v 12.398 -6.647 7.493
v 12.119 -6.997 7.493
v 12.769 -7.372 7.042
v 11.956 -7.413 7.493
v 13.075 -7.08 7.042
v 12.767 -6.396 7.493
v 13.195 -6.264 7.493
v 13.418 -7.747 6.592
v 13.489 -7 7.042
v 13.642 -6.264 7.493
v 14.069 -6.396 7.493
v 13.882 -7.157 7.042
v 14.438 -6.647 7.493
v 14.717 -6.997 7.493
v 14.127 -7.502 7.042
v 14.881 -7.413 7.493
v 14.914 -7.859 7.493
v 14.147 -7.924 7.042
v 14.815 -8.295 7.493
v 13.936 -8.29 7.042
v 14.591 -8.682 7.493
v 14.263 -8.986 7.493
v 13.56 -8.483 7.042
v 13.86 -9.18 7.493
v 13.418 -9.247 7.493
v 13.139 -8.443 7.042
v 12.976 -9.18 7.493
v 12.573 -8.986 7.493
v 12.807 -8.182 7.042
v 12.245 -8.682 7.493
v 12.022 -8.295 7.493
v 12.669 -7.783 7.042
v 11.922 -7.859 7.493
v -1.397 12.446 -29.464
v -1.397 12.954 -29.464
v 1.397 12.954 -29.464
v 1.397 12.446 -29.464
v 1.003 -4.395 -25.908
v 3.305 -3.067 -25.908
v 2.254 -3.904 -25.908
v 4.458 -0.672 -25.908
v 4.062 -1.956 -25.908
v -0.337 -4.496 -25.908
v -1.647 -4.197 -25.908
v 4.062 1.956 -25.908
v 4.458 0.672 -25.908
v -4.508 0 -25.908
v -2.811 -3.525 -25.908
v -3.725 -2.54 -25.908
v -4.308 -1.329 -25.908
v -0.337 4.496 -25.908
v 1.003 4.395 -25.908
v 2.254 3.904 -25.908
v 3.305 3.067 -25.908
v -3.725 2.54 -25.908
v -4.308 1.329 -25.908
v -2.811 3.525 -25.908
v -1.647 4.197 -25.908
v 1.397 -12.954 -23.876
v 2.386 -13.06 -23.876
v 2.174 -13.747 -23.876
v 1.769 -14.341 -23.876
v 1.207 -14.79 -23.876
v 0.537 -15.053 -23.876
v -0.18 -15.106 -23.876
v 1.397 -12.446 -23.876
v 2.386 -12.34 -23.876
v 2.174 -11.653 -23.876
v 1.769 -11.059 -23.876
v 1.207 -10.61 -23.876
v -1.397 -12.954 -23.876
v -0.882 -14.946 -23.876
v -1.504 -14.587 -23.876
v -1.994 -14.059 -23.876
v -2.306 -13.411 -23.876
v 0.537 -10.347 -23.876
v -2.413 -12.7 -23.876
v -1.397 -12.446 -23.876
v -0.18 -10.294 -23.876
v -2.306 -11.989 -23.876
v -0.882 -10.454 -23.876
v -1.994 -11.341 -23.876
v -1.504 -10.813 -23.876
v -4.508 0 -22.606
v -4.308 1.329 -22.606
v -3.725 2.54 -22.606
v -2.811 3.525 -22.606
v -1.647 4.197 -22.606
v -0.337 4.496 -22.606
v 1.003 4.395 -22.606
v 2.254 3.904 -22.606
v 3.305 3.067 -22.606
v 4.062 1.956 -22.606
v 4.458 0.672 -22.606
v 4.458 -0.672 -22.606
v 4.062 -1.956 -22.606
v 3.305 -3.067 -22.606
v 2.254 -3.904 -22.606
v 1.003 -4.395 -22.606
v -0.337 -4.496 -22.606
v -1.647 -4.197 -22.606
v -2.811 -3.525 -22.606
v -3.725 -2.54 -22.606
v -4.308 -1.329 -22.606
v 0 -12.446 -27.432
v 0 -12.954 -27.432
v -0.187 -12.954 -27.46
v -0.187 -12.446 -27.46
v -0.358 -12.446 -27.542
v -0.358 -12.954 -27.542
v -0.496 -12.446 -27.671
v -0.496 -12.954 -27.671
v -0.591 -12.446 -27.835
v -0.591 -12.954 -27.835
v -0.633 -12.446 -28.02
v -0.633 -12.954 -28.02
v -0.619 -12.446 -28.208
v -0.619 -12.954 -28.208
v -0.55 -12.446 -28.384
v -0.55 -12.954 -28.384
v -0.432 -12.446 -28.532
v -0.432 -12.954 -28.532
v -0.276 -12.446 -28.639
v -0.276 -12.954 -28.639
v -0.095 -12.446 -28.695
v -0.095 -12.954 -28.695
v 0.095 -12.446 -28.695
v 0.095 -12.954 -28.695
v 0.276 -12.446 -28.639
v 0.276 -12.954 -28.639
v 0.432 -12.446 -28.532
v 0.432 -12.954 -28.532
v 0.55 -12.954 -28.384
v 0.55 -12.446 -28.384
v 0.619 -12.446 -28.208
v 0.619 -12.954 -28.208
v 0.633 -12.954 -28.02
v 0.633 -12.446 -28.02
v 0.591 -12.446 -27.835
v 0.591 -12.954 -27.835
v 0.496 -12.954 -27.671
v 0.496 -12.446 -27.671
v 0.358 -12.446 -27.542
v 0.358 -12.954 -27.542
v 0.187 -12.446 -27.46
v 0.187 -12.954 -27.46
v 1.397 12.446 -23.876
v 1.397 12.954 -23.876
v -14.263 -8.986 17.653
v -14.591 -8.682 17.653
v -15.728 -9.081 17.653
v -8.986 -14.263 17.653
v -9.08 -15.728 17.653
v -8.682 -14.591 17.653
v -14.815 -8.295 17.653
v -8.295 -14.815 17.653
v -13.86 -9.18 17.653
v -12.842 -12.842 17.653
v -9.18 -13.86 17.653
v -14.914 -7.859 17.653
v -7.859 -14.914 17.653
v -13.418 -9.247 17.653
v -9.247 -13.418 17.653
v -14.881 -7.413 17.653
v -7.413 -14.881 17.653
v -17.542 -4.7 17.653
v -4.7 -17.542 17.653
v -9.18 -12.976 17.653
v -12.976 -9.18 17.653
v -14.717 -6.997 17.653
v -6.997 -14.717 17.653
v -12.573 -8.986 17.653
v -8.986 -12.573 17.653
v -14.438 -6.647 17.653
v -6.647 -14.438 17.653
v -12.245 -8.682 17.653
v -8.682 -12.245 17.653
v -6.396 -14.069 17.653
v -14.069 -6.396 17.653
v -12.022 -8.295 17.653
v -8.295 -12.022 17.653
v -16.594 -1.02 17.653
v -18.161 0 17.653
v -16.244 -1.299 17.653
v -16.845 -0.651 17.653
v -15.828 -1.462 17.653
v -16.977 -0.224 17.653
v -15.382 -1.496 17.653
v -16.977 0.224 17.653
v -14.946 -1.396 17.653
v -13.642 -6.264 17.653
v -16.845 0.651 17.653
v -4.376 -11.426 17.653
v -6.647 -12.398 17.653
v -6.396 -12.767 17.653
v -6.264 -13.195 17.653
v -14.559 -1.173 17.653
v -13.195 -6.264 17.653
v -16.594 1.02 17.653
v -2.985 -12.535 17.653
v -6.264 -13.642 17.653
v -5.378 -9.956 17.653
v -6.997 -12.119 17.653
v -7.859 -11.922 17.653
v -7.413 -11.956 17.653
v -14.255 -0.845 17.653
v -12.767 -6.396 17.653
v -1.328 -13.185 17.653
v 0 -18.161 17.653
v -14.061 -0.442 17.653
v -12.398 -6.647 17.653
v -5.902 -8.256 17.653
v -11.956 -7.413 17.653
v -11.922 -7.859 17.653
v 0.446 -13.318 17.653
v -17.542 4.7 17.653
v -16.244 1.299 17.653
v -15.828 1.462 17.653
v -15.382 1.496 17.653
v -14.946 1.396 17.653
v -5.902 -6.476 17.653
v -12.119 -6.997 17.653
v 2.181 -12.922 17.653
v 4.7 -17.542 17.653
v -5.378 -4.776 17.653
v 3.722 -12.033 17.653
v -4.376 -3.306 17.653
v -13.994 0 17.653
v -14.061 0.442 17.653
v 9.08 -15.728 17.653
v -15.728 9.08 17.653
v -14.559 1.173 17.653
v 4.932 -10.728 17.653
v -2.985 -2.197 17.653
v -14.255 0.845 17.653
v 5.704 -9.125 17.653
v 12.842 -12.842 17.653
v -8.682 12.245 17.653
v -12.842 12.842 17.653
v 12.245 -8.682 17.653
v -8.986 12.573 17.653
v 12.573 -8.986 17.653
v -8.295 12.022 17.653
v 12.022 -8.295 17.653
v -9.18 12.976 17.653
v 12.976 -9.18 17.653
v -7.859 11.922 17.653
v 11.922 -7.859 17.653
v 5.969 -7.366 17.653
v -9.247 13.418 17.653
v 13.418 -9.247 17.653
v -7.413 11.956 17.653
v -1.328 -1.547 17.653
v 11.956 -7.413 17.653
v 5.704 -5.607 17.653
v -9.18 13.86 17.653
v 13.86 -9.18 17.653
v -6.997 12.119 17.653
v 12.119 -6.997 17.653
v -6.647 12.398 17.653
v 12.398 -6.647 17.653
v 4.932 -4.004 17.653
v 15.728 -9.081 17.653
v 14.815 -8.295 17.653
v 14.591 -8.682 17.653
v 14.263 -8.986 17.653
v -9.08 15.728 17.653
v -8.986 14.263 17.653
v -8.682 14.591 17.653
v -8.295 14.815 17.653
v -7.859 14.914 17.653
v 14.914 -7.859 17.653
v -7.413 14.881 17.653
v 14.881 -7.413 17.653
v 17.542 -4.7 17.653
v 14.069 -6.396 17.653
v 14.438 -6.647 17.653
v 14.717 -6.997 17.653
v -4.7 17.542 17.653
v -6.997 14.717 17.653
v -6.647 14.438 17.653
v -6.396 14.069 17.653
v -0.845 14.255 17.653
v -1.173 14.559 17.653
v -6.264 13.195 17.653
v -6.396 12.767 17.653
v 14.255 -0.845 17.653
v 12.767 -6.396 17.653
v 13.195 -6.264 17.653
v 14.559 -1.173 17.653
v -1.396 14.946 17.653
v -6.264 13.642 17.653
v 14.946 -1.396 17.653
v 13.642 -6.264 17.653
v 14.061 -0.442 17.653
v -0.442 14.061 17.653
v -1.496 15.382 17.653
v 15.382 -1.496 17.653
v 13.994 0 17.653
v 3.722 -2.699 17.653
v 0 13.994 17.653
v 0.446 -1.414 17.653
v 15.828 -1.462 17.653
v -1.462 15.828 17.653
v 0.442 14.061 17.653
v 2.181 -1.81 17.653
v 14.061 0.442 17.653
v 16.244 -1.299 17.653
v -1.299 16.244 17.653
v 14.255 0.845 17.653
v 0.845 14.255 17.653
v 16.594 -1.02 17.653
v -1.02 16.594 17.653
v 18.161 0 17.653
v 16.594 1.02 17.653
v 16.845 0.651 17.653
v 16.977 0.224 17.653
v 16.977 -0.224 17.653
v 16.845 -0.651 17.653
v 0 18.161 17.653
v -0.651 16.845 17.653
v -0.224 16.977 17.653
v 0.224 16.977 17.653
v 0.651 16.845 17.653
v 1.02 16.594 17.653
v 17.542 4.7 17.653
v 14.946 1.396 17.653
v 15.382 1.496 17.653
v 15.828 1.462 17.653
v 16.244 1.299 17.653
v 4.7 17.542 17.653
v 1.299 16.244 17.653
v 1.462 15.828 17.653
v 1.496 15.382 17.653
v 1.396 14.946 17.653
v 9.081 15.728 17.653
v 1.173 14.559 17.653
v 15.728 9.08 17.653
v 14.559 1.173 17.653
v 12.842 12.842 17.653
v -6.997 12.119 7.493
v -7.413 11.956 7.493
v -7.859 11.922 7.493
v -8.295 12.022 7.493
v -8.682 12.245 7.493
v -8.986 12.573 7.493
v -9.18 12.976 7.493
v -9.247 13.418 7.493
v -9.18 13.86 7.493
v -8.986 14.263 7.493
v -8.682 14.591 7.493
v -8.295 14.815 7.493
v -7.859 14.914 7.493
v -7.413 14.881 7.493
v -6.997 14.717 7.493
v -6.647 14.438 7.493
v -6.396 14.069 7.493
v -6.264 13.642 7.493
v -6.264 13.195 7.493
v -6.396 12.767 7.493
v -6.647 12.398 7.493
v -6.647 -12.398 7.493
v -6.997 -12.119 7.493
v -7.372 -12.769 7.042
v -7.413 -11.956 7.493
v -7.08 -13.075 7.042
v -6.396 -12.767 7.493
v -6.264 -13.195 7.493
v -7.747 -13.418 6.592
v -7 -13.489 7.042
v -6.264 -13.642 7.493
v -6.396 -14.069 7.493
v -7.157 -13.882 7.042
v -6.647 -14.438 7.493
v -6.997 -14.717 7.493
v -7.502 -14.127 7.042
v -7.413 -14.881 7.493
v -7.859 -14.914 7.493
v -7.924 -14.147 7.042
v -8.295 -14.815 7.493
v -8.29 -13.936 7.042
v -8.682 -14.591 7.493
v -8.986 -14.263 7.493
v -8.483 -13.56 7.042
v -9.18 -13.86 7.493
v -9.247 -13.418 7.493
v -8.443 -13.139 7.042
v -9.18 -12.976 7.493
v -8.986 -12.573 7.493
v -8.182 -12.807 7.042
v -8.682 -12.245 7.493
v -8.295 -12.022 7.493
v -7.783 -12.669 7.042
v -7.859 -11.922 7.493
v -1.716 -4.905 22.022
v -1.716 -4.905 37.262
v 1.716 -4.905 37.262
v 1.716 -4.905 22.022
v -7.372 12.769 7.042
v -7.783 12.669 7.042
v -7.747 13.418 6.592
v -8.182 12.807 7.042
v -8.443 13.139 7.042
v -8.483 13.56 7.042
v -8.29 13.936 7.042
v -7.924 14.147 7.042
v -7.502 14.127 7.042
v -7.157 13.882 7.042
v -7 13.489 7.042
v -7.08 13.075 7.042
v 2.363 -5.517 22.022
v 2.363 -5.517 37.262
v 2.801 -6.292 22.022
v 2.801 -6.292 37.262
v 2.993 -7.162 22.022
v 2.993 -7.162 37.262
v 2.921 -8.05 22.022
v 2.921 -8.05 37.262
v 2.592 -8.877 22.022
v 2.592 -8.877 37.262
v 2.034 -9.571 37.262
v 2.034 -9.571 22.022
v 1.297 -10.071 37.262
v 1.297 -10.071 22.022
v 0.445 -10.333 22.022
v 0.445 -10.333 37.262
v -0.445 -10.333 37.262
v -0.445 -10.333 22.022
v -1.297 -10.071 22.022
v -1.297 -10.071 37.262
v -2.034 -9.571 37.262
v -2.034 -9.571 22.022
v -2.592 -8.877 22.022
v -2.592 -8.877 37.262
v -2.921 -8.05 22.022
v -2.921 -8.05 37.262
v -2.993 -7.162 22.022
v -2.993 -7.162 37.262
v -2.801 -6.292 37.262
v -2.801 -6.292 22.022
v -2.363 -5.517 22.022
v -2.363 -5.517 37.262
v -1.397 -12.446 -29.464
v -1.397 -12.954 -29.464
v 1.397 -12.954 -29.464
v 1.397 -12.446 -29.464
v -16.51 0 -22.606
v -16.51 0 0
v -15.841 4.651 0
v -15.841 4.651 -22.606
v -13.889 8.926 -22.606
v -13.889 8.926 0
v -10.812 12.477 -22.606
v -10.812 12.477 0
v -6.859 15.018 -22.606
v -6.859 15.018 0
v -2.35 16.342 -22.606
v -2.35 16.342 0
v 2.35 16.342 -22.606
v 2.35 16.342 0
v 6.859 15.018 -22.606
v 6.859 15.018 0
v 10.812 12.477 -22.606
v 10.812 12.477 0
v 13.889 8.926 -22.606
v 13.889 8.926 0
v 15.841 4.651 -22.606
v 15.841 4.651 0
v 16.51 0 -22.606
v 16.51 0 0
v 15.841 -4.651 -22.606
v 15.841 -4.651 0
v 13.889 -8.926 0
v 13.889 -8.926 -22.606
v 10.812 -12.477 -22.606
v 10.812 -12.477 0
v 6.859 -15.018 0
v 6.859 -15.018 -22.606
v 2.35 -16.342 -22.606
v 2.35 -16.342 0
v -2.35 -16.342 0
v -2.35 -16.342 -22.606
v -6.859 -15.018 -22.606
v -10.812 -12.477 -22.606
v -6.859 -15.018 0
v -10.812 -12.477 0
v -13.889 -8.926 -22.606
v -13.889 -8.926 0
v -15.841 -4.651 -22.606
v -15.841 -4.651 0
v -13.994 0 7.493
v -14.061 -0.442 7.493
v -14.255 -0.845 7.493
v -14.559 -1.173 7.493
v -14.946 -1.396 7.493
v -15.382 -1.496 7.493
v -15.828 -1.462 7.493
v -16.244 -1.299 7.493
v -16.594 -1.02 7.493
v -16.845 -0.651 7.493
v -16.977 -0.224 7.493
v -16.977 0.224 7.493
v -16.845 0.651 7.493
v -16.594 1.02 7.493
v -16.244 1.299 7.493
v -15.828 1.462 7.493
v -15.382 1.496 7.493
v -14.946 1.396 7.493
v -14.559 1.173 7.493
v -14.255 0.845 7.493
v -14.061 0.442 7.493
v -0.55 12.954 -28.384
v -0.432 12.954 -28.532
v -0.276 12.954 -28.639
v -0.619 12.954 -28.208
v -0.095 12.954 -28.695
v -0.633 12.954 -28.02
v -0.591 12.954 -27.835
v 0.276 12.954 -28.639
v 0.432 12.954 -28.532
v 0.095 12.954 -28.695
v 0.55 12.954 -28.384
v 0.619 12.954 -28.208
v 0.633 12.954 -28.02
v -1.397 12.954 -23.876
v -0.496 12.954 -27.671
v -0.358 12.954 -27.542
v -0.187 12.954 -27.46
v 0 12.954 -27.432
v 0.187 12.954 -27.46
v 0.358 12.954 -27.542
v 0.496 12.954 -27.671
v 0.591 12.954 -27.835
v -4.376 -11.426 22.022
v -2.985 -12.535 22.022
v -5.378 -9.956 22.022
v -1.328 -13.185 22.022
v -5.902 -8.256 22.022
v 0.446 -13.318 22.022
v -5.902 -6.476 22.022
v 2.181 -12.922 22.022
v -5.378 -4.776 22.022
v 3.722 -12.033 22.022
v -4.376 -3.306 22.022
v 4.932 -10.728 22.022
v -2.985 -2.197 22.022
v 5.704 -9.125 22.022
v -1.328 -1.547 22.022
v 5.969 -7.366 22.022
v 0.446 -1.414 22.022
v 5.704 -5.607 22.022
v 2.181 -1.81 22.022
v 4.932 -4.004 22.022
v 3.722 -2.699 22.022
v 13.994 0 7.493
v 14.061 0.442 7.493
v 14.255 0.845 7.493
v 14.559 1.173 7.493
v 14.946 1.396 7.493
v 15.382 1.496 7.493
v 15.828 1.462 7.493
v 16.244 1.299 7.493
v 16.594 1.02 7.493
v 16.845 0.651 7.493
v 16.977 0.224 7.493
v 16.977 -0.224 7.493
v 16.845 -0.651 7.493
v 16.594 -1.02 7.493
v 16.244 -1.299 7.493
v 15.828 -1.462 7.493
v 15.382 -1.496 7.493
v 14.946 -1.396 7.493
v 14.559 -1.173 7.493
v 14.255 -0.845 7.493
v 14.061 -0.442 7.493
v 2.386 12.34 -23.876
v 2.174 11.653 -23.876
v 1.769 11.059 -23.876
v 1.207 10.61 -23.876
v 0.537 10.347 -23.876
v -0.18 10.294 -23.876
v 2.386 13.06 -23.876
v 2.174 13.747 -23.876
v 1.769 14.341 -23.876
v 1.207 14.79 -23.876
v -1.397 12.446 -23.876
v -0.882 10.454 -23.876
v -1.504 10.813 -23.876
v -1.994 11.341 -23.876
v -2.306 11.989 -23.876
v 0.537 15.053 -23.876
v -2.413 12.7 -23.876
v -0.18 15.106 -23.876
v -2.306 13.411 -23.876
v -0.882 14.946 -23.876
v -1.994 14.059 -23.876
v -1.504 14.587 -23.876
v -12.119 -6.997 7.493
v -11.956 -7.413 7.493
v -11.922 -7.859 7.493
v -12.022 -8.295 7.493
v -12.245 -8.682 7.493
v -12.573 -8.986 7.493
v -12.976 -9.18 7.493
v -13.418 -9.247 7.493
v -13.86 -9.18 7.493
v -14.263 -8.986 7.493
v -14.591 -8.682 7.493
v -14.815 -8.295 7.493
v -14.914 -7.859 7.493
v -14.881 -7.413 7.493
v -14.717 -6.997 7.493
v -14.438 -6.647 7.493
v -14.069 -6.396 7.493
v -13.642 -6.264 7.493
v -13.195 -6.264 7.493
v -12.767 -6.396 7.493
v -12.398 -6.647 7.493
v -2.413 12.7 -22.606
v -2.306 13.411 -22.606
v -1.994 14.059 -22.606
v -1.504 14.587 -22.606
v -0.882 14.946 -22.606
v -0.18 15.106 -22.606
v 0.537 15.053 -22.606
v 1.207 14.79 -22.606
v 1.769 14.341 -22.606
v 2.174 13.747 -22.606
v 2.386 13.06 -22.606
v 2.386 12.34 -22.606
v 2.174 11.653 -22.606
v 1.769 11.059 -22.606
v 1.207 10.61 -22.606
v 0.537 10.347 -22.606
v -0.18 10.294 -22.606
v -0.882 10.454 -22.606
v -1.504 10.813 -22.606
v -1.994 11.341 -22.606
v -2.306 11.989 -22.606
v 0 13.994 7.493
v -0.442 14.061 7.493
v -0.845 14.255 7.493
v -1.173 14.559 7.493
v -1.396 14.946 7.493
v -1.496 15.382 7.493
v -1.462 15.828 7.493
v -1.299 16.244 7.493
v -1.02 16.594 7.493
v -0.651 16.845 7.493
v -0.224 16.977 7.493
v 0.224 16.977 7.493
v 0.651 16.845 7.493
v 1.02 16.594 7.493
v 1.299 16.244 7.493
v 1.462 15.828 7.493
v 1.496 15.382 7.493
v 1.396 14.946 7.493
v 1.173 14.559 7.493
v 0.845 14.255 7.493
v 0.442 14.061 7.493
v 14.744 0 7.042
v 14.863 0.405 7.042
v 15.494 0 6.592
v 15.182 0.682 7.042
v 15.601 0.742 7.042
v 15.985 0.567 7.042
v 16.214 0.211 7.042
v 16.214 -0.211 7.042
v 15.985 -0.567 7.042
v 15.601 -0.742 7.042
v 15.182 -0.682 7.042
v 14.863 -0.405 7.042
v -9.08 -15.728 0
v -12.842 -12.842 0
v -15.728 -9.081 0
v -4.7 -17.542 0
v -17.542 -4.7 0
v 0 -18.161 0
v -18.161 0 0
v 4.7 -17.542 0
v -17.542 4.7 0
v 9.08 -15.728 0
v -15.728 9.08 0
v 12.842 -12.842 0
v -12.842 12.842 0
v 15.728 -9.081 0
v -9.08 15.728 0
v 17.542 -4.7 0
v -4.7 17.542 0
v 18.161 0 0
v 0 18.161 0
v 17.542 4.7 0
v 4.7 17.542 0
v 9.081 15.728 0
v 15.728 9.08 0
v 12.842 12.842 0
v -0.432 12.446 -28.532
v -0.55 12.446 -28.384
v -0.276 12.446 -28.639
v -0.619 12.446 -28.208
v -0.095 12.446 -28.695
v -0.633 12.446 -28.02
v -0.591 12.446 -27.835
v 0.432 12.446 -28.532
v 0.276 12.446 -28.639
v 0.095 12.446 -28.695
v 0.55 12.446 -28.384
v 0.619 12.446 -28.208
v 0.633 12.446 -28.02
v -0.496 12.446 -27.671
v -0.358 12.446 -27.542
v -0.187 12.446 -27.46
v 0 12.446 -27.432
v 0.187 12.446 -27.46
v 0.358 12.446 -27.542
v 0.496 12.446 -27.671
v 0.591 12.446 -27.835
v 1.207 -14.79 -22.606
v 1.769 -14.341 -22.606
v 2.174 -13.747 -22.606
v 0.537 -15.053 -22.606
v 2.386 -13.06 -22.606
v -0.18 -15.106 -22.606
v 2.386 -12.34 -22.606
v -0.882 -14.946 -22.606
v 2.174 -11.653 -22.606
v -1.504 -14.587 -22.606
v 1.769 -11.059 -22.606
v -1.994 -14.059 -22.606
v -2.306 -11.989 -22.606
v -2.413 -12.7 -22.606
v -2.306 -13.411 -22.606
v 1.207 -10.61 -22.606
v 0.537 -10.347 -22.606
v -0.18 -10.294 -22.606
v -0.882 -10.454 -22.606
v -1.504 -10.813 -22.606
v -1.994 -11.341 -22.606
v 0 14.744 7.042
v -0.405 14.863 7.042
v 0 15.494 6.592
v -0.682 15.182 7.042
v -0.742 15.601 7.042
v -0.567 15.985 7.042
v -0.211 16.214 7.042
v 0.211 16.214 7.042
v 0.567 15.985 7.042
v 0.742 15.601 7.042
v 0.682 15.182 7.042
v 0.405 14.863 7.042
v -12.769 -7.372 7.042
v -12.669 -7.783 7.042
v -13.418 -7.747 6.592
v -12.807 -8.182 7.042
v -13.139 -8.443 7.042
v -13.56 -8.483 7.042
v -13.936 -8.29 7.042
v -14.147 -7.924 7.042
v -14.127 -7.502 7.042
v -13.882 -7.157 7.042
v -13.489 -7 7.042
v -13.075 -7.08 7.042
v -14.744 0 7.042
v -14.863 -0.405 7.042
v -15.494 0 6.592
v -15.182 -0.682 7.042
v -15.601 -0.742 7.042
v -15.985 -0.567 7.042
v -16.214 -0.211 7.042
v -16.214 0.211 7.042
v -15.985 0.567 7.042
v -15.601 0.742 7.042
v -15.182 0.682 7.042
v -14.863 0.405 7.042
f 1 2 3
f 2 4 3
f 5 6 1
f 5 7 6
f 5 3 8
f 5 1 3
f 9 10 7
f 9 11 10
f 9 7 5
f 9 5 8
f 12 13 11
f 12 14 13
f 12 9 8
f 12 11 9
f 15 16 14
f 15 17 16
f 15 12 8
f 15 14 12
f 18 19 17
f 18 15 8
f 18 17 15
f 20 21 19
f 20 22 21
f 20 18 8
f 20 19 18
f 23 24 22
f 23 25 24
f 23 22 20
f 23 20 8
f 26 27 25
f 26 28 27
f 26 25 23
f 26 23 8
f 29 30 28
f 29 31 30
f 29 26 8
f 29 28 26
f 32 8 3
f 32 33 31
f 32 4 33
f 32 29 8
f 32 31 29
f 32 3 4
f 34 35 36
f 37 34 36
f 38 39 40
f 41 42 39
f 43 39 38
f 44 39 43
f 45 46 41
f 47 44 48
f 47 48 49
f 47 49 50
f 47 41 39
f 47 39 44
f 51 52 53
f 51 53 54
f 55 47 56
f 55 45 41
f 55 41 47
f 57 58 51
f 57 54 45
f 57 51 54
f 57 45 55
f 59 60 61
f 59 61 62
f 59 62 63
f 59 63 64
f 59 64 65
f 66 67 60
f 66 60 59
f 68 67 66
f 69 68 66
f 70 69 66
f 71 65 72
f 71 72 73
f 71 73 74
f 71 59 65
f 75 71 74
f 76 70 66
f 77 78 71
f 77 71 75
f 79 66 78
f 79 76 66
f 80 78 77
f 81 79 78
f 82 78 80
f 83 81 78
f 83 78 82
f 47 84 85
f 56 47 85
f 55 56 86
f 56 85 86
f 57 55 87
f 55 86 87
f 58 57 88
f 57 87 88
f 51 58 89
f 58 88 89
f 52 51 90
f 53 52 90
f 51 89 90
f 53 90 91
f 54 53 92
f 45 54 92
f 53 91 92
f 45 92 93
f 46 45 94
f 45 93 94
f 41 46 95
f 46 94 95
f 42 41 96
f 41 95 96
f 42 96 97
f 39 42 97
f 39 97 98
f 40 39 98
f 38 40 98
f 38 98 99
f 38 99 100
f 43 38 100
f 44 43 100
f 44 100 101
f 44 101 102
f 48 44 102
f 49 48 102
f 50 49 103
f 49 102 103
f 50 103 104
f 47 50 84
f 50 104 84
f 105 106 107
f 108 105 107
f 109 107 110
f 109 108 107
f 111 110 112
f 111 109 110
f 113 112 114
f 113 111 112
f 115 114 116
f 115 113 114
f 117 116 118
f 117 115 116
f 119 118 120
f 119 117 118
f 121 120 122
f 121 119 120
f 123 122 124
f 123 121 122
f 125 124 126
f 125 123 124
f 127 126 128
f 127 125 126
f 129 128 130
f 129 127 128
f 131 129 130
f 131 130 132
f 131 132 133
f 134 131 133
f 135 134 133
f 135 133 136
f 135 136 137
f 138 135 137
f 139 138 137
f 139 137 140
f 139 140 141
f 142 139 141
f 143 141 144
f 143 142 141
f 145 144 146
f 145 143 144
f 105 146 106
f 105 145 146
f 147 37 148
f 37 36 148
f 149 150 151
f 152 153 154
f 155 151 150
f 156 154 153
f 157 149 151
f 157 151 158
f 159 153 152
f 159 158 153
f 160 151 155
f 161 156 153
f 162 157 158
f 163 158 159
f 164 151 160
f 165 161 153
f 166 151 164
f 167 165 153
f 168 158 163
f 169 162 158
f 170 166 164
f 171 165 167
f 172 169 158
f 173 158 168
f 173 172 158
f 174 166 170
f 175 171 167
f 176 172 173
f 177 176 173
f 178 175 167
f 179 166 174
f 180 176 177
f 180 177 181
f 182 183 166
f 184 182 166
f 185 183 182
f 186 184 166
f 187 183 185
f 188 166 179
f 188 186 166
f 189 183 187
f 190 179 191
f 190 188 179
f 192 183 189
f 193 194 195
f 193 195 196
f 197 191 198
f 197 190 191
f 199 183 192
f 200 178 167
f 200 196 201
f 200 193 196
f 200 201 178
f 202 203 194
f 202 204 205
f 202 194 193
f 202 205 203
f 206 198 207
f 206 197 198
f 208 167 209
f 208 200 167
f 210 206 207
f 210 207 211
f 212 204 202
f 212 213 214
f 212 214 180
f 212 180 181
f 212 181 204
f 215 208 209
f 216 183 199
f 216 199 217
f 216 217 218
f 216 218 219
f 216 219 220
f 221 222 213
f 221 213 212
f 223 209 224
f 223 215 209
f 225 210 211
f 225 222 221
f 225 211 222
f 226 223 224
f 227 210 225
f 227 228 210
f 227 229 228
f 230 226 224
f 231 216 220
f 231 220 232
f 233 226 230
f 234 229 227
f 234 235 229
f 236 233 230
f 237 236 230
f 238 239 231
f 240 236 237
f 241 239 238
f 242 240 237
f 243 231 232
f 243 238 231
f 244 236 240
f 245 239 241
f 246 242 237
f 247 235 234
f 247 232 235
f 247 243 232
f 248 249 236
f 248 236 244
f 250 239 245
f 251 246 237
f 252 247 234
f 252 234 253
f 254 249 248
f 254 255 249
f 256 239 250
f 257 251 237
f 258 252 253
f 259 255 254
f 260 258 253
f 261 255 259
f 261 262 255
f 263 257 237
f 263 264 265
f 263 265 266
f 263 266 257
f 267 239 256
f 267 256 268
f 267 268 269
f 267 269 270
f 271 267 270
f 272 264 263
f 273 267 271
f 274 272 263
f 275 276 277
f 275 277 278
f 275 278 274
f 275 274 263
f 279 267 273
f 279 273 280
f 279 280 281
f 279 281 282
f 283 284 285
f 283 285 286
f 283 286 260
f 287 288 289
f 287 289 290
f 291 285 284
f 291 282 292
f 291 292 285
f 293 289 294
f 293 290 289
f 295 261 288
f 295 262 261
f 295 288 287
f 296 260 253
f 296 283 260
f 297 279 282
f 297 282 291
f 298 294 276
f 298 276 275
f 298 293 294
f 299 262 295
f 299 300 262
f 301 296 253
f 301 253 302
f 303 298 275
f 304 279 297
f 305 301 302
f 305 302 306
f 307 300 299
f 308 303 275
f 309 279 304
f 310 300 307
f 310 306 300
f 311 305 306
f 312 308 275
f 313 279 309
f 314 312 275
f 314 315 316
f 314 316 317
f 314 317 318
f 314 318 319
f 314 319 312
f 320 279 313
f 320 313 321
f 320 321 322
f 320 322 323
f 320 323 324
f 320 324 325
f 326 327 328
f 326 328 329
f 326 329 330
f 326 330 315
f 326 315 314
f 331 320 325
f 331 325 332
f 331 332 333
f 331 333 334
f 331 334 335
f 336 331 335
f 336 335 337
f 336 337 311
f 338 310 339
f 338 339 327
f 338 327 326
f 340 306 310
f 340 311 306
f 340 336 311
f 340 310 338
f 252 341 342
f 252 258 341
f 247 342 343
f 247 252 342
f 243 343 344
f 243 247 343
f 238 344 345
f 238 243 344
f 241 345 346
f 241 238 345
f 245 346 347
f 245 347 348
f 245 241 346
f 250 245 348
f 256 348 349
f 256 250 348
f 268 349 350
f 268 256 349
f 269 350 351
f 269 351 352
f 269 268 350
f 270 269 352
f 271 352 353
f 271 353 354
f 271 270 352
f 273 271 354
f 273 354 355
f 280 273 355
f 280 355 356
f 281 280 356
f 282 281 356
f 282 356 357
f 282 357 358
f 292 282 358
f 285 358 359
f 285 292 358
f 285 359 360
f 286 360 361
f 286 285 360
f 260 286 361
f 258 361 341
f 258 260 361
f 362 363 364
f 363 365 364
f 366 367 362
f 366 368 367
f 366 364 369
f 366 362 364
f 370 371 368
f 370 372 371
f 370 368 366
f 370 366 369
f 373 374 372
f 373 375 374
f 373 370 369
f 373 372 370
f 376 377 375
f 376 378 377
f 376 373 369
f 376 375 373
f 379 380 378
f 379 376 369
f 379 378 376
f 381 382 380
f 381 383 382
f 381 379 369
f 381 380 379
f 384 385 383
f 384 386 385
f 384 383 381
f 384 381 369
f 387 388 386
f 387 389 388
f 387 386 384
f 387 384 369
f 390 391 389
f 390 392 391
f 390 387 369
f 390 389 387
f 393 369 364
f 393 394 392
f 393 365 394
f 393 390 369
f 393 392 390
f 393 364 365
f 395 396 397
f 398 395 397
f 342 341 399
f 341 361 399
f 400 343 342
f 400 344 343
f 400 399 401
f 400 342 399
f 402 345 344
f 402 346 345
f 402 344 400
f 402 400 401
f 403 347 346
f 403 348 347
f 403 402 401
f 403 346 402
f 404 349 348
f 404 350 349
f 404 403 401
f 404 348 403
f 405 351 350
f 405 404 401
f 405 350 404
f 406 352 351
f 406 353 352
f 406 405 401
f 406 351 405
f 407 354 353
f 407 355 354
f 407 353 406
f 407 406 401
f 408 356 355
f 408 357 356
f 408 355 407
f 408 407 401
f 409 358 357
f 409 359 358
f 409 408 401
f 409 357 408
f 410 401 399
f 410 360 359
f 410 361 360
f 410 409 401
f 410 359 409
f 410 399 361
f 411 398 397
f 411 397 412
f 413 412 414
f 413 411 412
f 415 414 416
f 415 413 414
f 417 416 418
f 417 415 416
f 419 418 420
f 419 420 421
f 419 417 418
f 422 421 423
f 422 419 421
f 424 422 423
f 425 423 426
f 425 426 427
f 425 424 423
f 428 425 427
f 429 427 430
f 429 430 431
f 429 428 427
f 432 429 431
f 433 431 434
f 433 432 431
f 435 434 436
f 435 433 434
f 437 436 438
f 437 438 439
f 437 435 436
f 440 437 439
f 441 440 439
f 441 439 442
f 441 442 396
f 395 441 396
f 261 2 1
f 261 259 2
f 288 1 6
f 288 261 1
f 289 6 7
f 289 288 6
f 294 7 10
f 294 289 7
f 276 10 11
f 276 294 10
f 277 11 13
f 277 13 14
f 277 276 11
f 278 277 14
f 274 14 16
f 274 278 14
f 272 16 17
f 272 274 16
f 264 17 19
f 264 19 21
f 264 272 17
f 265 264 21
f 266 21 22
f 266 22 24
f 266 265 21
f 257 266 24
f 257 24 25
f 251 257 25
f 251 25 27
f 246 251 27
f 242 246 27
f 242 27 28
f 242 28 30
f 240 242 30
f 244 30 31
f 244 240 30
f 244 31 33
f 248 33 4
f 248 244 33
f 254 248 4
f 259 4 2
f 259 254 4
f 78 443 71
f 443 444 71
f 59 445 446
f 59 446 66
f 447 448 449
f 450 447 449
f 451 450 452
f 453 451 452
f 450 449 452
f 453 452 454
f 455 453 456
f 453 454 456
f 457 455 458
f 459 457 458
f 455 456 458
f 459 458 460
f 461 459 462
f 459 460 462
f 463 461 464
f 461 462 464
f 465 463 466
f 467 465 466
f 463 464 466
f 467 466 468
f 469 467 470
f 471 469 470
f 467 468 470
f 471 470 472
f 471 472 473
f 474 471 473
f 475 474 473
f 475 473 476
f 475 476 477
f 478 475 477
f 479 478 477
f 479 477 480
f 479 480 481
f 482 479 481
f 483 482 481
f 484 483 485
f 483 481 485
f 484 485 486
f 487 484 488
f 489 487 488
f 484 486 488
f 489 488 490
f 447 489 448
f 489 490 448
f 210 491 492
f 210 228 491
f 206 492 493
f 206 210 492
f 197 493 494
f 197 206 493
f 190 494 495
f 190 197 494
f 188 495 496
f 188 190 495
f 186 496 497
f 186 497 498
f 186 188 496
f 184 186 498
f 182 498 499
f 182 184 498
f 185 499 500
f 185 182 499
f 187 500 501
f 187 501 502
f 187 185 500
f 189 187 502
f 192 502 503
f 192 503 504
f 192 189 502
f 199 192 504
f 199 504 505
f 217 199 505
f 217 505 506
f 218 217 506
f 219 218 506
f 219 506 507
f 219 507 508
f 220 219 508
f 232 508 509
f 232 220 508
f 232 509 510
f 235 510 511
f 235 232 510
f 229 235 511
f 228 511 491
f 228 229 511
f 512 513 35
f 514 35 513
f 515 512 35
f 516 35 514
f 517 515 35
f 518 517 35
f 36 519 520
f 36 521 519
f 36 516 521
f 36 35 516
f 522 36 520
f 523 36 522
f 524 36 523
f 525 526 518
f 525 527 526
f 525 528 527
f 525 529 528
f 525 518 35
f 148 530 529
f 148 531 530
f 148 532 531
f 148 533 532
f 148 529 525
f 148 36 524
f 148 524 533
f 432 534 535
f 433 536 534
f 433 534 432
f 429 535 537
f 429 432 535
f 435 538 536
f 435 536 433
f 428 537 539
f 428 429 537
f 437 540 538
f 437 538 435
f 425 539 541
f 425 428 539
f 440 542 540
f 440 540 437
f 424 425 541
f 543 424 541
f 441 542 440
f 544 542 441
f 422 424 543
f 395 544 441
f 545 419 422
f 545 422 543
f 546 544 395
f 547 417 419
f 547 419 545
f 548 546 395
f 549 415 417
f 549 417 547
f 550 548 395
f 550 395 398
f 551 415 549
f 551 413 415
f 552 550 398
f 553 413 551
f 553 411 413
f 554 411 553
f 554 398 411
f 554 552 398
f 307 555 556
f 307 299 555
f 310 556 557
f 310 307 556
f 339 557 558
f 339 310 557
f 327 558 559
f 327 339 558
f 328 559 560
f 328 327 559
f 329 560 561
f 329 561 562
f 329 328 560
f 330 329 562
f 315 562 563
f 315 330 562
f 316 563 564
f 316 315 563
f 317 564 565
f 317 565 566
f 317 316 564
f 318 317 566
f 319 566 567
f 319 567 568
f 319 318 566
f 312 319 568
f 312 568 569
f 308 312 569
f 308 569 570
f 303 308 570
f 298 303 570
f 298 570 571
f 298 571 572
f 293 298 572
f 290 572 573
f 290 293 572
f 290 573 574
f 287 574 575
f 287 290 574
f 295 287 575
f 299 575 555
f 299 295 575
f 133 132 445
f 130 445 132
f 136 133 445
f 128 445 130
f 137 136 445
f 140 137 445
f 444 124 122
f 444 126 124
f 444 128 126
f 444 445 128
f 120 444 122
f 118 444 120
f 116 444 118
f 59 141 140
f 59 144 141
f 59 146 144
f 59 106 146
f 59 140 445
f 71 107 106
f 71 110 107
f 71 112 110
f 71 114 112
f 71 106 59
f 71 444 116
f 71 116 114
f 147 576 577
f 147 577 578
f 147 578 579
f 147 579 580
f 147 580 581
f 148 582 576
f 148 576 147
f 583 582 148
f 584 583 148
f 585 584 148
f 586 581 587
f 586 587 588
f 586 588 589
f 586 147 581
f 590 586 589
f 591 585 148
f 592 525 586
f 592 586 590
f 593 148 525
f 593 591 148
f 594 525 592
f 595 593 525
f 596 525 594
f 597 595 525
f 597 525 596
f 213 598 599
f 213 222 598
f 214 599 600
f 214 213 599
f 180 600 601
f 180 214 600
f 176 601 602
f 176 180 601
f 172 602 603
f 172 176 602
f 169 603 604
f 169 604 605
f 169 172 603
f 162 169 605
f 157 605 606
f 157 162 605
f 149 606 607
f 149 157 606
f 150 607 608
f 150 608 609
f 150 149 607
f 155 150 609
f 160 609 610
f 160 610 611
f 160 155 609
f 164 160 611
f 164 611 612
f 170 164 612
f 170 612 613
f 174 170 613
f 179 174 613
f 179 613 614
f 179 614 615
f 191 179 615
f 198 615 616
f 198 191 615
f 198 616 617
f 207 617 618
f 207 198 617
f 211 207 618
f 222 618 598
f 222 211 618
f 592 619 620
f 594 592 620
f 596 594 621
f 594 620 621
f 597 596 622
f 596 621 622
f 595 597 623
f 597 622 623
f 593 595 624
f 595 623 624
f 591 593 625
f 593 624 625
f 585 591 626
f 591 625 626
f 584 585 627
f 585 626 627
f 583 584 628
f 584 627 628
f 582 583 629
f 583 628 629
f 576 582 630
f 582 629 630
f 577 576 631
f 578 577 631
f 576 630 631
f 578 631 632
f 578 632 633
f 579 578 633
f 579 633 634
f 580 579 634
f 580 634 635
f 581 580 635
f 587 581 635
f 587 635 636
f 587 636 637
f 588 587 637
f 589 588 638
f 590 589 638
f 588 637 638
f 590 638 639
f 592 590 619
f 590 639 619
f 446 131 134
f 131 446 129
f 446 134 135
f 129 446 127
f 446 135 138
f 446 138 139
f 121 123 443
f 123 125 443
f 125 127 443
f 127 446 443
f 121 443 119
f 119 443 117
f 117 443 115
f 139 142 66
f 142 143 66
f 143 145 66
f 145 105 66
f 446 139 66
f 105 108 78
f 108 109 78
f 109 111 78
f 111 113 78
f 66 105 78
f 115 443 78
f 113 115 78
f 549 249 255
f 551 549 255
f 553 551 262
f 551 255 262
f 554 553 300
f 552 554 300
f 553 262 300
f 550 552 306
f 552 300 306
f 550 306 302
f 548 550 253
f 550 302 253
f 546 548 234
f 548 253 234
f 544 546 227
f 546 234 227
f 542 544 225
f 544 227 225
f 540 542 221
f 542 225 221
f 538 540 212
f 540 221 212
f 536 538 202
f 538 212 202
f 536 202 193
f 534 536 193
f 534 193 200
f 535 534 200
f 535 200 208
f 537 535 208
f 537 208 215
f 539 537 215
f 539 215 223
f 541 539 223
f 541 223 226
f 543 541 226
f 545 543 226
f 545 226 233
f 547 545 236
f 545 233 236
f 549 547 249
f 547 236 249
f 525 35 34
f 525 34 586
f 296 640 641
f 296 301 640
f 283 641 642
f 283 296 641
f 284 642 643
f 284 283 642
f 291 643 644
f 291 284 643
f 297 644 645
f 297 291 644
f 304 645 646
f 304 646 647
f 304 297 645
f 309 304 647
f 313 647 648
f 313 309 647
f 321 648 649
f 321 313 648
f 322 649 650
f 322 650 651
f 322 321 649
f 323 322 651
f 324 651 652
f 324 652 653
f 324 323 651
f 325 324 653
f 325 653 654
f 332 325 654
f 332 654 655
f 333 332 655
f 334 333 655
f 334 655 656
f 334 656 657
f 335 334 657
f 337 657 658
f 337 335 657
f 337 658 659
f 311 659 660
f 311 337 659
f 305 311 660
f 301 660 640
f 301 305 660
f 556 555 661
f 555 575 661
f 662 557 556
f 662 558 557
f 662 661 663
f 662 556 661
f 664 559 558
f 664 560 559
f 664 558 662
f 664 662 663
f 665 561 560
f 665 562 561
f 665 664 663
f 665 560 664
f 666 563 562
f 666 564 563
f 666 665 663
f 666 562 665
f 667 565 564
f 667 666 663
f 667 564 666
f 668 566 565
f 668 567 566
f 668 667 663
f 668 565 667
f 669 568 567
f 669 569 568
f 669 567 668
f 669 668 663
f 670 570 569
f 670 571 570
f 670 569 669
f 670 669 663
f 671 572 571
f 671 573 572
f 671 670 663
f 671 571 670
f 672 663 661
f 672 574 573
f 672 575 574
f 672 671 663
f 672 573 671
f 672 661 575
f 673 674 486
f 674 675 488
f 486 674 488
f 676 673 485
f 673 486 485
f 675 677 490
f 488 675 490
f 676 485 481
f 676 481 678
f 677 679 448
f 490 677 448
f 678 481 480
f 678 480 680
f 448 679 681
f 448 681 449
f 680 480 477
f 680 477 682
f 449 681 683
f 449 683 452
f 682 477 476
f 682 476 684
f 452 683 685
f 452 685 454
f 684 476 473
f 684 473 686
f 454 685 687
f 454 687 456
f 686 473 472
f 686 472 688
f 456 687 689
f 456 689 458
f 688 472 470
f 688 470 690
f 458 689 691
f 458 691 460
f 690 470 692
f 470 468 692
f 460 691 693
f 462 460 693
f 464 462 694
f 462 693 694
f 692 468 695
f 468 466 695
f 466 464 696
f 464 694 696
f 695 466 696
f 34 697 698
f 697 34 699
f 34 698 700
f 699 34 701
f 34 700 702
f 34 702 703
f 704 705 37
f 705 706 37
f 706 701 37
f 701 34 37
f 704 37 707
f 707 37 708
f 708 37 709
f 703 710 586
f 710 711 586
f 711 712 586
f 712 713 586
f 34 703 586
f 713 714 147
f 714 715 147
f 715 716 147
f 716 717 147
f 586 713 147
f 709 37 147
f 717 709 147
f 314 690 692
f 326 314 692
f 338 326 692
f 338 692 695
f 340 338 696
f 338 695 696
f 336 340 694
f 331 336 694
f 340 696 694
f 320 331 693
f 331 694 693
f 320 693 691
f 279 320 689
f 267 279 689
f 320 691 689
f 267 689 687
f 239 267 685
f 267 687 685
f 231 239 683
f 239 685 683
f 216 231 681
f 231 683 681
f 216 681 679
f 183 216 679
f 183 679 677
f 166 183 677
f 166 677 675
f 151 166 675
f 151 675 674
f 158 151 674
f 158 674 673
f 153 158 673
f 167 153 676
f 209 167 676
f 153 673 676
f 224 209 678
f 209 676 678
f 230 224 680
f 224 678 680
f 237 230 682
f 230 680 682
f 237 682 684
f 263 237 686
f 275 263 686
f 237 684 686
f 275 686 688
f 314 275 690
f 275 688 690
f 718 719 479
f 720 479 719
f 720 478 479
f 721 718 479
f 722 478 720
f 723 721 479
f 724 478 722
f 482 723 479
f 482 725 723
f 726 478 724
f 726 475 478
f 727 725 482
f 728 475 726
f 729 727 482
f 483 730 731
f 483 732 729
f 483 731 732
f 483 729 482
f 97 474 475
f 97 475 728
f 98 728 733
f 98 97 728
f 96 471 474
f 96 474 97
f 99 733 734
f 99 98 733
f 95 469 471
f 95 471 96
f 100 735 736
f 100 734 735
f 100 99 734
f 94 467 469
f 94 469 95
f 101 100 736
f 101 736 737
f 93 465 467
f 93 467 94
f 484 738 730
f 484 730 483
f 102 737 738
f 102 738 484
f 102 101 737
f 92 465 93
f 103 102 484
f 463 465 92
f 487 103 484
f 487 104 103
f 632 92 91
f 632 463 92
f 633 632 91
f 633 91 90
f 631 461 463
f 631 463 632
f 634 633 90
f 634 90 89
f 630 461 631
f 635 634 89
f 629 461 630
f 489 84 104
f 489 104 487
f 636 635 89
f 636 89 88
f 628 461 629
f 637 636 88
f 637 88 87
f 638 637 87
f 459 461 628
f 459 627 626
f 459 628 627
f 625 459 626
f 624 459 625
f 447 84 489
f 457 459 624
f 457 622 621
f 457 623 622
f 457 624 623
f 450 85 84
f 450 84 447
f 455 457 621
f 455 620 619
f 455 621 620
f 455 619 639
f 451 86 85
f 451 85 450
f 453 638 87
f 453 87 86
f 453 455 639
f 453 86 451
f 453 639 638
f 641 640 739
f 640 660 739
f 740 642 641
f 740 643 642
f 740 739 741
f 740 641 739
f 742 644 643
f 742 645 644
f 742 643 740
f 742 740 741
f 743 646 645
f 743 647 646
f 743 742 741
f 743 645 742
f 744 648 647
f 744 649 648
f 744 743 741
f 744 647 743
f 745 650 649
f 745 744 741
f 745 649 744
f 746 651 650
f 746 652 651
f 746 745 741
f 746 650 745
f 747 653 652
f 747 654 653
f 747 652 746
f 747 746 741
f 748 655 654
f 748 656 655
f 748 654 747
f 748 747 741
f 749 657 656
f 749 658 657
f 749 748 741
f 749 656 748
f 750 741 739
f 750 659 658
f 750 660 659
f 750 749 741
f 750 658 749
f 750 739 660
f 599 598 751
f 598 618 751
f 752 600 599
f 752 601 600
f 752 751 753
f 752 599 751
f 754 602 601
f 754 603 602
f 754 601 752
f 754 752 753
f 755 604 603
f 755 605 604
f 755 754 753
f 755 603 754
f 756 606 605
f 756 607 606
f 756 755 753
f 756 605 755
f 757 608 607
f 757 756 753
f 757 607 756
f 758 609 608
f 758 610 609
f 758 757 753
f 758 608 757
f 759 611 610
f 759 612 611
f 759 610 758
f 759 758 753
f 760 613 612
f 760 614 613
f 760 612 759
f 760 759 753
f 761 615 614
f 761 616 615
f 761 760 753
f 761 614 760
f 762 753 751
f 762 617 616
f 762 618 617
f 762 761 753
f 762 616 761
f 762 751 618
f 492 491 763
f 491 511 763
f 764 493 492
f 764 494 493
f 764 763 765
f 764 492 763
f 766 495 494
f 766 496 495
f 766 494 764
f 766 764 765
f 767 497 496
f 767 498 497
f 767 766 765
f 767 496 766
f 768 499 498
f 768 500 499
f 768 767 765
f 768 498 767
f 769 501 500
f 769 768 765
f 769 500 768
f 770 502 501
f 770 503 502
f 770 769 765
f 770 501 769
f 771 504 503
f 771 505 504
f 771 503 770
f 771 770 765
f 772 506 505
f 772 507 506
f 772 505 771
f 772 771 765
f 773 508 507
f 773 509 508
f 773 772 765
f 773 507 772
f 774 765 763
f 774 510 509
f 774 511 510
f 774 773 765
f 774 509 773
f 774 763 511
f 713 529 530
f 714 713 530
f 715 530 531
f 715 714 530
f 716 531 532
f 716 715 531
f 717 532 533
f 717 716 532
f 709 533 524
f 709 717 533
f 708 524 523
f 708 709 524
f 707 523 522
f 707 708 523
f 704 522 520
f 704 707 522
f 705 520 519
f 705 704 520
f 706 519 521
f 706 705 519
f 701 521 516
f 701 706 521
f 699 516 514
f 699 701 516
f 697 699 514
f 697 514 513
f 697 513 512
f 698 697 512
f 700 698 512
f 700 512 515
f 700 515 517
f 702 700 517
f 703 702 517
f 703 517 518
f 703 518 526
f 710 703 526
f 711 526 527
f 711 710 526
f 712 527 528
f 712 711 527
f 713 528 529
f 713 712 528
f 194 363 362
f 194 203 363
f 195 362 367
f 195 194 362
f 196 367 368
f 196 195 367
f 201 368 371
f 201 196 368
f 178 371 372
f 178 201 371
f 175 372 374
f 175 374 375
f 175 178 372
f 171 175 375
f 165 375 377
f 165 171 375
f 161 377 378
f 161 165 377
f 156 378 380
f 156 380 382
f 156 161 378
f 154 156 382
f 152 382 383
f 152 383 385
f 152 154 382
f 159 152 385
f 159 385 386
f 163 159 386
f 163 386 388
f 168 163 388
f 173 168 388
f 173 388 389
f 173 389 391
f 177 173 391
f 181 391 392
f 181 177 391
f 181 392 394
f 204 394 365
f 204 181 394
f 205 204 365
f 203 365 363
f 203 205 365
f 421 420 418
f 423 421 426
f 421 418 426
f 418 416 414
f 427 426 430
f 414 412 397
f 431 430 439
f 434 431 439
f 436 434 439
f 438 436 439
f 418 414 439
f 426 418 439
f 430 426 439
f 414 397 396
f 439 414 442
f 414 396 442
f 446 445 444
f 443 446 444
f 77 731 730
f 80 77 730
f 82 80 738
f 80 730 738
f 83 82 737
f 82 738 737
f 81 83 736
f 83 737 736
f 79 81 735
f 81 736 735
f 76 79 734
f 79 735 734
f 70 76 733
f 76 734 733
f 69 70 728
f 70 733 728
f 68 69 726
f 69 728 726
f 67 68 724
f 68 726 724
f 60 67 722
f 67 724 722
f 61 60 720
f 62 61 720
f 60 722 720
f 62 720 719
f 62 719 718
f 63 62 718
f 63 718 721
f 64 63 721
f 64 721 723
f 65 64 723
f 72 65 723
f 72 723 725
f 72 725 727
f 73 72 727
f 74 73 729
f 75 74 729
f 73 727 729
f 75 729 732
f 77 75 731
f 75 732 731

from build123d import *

# Parameters (mm, degrees)
SKETCH1_R           = 18.161
BOSS_EXTRUDE1_DEPTH = 17.653
SKETCH2_R           = 16.51
BOSS_EXTRUDE2_DEPTH = 22.606
SKETCH3_R           = 4.5085
BOSS_EXTRUDE3_DEPTH = 3.302
SKETCH4_R           = 2.413
BOSS_EXTRUDE4_DEPTH = 1.27
SKETCH5_R           = 5.969
BOSS_EXTRUDE5_DEPTH = 4.3688
BOSS_EXTRUDE6_DEPTH = 15.24
SKETCH8_W           = 5.588
SKETCH8_H           = 2.794
SKETCH8_R           = 0.635
BOSS_EXTRUDE7_DEPTH = 0.254
CIRPATTERN1_COUNT   = 2
CIRPATTERN2_COUNT   = 12


with BuildPart() as part:
    # Sketch1 → Boss-Extrude1 (new body)
    with BuildSketch(Plane.XY):
        Circle(SKETCH1_R)
    extrude(amount=BOSS_EXTRUDE1_DEPTH)

    # Sketch2 → Boss-Extrude2 (add)
    with BuildSketch(Plane(origin=(0, 0, 0), x_dir=(-1, 0, 0), z_dir=(0, 0, -1))):
        Circle(SKETCH2_R)
    extrude(amount=BOSS_EXTRUDE2_DEPTH)

    # Sketch3 → Boss-Extrude3 (add)
    with BuildSketch(Plane(origin=(0, 0, -22.606), x_dir=(-1, 0, 0), z_dir=(0, 0, -1))):
        Circle(SKETCH3_R)
    extrude(amount=BOSS_EXTRUDE3_DEPTH)

    # Sketch4 → Boss-Extrude4 (add)
    with BuildSketch(Plane(origin=(0, 0, -22.606), x_dir=(-1, 0, 0), z_dir=(0, 0, -1))):
        with Locations((0, -12.7)):
            Circle(SKETCH4_R)
        with Locations((0, 12.7)):
            Circle(SKETCH4_R)
    extrude(amount=BOSS_EXTRUDE4_DEPTH)

    # Sketch5 → Boss-Extrude5 (add)
    with BuildSketch(Plane.XY.offset(17.653)):
        with Locations((0, -7.366)):
            Circle(SKETCH5_R)
    extrude(amount=BOSS_EXTRUDE5_DEPTH)

    # Sketch6 → Boss-Extrude6 (add)
    with BuildSketch(Plane.XY.offset(22.0218)):
        with BuildLine():
            Line((-1.715657017, -4.905), (1.715657017, -4.905))
            ThreePointArc((1.715657017, -4.905), (0, -10.366), (-1.715657017, -4.905))
        make_face()
    extrude(amount=BOSS_EXTRUDE6_DEPTH)

    # Sketch8 → Boss-Extrude7 (add, symmetric)
    with BuildSketch(Plane.ZX.offset(12.7)):
        with Locations((-26.67, 0)):
            Rectangle(SKETCH8_W, SKETCH8_H)
        with Locations((-28.067, 0)):
            Circle(SKETCH8_R, mode=Mode.SUBTRACT)
    boss_extrude7 = extrude(amount=BOSS_EXTRUDE7_DEPTH, both=True)

    # CirPattern1: Boss-Extrude7 ×2 about axis
    cirpattern1_axis = Axis((0, 0, -25.908), (0, 0, 1))
    for i in range(1, CIRPATTERN1_COUNT):
        add(boss_extrude7.rotate(cirpattern1_axis, i * 360 / CIRPATTERN1_COUNT))

    # Sketch12 → Ø3.0mm Dowel Hole1 (revolve, cut)
    with BuildSketch(Plane(origin=(0, 15.494, 17.653), x_dir=(0, -1, 0), z_dir=(1, 0, 0))):
        Polygon((0, 0), (0, 11.061290929), (1.5, 10.16), (1.5, 0), align=None)
    f_3_0mm_dowel_hole1 = revolve(axis=Axis((0, 15.494, 24.003), (0, 0, -1)), mode=Mode.SUBTRACT)

    # CirPattern2: Ø3.0mm Dowel Hole1 ×12 about axis, 5 skipped
    cirpattern2_axis = Axis((0, 0, 17.653), (0, 0, -1))
    add([f_3_0mm_dowel_hole1.rotate(cirpattern2_axis, i * 360 / CIRPATTERN2_COUNT) for i in range(1, CIRPATTERN2_COUNT) if i not in (1, 2, 5, 6, 10)], mode=Mode.SUBTRACT)


solid = part.part
